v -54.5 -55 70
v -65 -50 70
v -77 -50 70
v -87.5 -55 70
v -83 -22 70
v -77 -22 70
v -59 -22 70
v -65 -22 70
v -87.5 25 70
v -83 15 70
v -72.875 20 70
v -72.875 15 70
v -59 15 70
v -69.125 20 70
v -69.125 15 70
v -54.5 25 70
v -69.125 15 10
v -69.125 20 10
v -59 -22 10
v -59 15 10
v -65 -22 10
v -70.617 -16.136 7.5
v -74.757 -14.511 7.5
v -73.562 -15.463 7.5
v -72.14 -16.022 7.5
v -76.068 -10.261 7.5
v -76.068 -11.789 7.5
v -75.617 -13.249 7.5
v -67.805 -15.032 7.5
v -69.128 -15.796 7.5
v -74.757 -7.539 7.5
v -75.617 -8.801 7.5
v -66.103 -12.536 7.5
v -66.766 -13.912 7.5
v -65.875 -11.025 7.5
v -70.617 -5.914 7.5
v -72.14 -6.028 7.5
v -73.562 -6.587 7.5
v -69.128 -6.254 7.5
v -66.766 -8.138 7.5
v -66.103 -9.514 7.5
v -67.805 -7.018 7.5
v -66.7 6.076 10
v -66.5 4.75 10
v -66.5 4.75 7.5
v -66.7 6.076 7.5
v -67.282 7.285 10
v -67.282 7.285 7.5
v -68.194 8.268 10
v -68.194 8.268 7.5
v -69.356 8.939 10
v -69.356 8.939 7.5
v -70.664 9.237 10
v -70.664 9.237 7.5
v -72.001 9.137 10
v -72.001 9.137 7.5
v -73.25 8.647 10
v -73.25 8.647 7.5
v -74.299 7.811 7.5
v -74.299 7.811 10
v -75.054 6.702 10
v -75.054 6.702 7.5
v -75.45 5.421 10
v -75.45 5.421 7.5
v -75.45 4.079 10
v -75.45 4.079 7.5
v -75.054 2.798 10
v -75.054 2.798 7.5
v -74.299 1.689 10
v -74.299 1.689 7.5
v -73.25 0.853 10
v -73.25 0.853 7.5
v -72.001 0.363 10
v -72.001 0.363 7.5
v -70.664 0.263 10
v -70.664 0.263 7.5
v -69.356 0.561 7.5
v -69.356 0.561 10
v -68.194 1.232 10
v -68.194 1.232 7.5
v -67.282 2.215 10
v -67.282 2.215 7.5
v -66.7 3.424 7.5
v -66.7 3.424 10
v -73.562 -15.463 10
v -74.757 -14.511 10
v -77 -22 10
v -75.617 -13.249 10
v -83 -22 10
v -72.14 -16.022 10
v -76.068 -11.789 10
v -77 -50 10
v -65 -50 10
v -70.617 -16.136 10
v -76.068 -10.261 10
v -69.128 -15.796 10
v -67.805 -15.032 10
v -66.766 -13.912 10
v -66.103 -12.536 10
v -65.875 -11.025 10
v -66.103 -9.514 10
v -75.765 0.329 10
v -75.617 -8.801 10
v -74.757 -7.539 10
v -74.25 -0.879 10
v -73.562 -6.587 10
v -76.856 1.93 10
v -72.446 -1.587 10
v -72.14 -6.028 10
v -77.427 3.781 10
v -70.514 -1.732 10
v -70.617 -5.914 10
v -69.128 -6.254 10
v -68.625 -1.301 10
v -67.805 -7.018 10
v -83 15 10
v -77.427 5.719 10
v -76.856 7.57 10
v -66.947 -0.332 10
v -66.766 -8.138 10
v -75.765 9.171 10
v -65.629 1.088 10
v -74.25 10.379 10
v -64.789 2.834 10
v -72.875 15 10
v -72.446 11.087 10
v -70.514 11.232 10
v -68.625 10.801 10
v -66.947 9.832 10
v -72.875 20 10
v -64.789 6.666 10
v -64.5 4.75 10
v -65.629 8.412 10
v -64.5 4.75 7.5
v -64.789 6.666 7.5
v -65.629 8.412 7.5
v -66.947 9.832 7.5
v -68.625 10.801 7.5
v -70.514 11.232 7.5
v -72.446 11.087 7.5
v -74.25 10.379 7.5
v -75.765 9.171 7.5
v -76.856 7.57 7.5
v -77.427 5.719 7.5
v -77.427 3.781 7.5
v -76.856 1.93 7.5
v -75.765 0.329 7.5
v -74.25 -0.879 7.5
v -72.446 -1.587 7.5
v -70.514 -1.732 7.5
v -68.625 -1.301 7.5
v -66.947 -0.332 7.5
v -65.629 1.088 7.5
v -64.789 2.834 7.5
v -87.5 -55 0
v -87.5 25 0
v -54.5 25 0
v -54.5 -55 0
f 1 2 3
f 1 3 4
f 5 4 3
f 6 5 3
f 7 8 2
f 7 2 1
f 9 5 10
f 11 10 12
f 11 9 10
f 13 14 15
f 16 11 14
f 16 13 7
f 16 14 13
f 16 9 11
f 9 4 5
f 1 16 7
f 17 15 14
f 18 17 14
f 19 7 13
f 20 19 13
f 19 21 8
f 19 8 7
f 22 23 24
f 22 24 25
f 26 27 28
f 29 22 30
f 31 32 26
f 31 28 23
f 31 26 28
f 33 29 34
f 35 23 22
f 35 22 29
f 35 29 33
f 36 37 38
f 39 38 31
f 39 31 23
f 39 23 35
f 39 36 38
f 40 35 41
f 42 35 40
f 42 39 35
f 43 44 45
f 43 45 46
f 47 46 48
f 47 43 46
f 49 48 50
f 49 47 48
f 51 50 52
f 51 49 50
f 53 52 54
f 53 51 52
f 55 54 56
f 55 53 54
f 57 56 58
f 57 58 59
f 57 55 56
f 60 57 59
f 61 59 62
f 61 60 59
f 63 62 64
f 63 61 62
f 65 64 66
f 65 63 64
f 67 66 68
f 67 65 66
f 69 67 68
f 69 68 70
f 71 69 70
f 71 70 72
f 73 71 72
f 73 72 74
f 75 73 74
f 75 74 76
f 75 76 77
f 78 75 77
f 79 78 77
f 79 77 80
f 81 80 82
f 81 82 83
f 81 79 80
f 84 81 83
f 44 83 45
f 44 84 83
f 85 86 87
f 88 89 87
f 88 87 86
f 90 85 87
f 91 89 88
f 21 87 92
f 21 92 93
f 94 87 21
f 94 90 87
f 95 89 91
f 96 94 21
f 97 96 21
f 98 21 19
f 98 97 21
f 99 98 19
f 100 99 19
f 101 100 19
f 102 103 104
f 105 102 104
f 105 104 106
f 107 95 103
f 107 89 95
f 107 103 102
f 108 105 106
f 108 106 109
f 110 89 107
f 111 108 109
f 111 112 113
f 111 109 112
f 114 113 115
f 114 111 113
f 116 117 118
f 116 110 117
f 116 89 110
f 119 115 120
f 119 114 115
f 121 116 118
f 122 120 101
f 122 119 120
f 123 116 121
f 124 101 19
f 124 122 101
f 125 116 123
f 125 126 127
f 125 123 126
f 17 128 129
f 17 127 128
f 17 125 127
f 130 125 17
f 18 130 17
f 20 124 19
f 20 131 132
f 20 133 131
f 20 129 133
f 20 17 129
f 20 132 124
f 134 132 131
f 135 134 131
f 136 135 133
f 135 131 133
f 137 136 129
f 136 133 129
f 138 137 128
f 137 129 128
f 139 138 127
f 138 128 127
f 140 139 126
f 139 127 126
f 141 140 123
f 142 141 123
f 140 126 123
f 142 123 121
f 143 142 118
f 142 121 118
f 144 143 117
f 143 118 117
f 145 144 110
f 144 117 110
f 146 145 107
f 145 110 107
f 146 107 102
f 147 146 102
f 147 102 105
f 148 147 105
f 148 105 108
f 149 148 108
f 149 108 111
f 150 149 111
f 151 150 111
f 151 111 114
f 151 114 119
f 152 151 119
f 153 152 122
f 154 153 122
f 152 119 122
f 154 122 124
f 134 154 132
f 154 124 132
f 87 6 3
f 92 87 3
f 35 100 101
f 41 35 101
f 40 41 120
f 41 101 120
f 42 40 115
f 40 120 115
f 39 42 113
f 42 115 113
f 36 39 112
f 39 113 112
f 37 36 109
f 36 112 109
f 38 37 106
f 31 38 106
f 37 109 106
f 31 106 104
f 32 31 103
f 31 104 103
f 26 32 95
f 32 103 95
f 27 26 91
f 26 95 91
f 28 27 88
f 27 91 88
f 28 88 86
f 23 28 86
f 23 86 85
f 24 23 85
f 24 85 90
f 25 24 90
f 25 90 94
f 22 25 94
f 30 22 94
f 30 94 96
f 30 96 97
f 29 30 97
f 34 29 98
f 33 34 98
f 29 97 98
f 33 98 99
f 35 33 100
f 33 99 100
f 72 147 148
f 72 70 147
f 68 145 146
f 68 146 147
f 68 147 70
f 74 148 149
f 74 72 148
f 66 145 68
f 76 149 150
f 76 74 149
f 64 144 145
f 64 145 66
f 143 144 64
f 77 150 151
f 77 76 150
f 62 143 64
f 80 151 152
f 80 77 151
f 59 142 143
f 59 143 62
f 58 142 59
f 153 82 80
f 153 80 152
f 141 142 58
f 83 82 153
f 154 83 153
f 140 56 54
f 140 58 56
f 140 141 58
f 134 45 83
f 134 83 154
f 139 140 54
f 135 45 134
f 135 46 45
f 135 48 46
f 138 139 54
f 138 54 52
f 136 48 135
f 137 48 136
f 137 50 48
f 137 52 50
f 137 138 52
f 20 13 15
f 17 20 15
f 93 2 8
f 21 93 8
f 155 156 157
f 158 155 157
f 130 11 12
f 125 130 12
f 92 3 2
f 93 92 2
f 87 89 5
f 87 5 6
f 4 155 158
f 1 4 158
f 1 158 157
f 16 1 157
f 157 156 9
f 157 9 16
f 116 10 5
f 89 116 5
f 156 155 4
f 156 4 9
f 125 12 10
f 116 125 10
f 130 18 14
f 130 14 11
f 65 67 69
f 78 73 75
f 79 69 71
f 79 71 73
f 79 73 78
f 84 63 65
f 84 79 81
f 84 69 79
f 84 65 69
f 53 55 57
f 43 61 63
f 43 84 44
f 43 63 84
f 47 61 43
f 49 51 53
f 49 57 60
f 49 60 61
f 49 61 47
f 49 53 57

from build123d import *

# Parameters (mm, degrees)
F0_W     = 33
F0_H     = 80
F1_DEPTH = 70
F3_DEPTH = 60
F4_R     = 6.5
F4_R_2   = 4.5
F4_R_3   = 5.125
F5_DEPTH = 2.5


with BuildPart() as f1:
    # F0 (on Top) → F1 (new body)
    with BuildSketch(Plane.XY):
        with Locations((-71, -15)):
            Rectangle(F0_W, F0_H)
    extrude(amount=F1_DEPTH)

    # F2 (on face) → F3 (cut)
    with BuildSketch(Plane.XY.offset(70)):
        Polygon((-72.875, 20), (-72.875, 15), (-83, 15), (-83, -22), (-77, -22), (-77, -50), (-71, -50), (-65, -50), (-65, -22), (-59, -22), (-59, 15), (-69.125, 15), (-69.125, 20), (-71, 20), align=None)
    extrude(amount=-F3_DEPTH, mode=Mode.SUBTRACT)

    # F4 (on face) → F5 (cut)
    with BuildSketch(Plane.XY.offset(10)):
        with Locations((-71, 4.75)):
            Circle(F4_R)
        with Locations((-71, 4.75)):
            Circle(F4_R_2, mode=Mode.SUBTRACT)
        with Locations((-71, -11.025)):
            Circle(F4_R_3)
    extrude(amount=-F5_DEPTH, mode=Mode.SUBTRACT)


solid = f1.part
